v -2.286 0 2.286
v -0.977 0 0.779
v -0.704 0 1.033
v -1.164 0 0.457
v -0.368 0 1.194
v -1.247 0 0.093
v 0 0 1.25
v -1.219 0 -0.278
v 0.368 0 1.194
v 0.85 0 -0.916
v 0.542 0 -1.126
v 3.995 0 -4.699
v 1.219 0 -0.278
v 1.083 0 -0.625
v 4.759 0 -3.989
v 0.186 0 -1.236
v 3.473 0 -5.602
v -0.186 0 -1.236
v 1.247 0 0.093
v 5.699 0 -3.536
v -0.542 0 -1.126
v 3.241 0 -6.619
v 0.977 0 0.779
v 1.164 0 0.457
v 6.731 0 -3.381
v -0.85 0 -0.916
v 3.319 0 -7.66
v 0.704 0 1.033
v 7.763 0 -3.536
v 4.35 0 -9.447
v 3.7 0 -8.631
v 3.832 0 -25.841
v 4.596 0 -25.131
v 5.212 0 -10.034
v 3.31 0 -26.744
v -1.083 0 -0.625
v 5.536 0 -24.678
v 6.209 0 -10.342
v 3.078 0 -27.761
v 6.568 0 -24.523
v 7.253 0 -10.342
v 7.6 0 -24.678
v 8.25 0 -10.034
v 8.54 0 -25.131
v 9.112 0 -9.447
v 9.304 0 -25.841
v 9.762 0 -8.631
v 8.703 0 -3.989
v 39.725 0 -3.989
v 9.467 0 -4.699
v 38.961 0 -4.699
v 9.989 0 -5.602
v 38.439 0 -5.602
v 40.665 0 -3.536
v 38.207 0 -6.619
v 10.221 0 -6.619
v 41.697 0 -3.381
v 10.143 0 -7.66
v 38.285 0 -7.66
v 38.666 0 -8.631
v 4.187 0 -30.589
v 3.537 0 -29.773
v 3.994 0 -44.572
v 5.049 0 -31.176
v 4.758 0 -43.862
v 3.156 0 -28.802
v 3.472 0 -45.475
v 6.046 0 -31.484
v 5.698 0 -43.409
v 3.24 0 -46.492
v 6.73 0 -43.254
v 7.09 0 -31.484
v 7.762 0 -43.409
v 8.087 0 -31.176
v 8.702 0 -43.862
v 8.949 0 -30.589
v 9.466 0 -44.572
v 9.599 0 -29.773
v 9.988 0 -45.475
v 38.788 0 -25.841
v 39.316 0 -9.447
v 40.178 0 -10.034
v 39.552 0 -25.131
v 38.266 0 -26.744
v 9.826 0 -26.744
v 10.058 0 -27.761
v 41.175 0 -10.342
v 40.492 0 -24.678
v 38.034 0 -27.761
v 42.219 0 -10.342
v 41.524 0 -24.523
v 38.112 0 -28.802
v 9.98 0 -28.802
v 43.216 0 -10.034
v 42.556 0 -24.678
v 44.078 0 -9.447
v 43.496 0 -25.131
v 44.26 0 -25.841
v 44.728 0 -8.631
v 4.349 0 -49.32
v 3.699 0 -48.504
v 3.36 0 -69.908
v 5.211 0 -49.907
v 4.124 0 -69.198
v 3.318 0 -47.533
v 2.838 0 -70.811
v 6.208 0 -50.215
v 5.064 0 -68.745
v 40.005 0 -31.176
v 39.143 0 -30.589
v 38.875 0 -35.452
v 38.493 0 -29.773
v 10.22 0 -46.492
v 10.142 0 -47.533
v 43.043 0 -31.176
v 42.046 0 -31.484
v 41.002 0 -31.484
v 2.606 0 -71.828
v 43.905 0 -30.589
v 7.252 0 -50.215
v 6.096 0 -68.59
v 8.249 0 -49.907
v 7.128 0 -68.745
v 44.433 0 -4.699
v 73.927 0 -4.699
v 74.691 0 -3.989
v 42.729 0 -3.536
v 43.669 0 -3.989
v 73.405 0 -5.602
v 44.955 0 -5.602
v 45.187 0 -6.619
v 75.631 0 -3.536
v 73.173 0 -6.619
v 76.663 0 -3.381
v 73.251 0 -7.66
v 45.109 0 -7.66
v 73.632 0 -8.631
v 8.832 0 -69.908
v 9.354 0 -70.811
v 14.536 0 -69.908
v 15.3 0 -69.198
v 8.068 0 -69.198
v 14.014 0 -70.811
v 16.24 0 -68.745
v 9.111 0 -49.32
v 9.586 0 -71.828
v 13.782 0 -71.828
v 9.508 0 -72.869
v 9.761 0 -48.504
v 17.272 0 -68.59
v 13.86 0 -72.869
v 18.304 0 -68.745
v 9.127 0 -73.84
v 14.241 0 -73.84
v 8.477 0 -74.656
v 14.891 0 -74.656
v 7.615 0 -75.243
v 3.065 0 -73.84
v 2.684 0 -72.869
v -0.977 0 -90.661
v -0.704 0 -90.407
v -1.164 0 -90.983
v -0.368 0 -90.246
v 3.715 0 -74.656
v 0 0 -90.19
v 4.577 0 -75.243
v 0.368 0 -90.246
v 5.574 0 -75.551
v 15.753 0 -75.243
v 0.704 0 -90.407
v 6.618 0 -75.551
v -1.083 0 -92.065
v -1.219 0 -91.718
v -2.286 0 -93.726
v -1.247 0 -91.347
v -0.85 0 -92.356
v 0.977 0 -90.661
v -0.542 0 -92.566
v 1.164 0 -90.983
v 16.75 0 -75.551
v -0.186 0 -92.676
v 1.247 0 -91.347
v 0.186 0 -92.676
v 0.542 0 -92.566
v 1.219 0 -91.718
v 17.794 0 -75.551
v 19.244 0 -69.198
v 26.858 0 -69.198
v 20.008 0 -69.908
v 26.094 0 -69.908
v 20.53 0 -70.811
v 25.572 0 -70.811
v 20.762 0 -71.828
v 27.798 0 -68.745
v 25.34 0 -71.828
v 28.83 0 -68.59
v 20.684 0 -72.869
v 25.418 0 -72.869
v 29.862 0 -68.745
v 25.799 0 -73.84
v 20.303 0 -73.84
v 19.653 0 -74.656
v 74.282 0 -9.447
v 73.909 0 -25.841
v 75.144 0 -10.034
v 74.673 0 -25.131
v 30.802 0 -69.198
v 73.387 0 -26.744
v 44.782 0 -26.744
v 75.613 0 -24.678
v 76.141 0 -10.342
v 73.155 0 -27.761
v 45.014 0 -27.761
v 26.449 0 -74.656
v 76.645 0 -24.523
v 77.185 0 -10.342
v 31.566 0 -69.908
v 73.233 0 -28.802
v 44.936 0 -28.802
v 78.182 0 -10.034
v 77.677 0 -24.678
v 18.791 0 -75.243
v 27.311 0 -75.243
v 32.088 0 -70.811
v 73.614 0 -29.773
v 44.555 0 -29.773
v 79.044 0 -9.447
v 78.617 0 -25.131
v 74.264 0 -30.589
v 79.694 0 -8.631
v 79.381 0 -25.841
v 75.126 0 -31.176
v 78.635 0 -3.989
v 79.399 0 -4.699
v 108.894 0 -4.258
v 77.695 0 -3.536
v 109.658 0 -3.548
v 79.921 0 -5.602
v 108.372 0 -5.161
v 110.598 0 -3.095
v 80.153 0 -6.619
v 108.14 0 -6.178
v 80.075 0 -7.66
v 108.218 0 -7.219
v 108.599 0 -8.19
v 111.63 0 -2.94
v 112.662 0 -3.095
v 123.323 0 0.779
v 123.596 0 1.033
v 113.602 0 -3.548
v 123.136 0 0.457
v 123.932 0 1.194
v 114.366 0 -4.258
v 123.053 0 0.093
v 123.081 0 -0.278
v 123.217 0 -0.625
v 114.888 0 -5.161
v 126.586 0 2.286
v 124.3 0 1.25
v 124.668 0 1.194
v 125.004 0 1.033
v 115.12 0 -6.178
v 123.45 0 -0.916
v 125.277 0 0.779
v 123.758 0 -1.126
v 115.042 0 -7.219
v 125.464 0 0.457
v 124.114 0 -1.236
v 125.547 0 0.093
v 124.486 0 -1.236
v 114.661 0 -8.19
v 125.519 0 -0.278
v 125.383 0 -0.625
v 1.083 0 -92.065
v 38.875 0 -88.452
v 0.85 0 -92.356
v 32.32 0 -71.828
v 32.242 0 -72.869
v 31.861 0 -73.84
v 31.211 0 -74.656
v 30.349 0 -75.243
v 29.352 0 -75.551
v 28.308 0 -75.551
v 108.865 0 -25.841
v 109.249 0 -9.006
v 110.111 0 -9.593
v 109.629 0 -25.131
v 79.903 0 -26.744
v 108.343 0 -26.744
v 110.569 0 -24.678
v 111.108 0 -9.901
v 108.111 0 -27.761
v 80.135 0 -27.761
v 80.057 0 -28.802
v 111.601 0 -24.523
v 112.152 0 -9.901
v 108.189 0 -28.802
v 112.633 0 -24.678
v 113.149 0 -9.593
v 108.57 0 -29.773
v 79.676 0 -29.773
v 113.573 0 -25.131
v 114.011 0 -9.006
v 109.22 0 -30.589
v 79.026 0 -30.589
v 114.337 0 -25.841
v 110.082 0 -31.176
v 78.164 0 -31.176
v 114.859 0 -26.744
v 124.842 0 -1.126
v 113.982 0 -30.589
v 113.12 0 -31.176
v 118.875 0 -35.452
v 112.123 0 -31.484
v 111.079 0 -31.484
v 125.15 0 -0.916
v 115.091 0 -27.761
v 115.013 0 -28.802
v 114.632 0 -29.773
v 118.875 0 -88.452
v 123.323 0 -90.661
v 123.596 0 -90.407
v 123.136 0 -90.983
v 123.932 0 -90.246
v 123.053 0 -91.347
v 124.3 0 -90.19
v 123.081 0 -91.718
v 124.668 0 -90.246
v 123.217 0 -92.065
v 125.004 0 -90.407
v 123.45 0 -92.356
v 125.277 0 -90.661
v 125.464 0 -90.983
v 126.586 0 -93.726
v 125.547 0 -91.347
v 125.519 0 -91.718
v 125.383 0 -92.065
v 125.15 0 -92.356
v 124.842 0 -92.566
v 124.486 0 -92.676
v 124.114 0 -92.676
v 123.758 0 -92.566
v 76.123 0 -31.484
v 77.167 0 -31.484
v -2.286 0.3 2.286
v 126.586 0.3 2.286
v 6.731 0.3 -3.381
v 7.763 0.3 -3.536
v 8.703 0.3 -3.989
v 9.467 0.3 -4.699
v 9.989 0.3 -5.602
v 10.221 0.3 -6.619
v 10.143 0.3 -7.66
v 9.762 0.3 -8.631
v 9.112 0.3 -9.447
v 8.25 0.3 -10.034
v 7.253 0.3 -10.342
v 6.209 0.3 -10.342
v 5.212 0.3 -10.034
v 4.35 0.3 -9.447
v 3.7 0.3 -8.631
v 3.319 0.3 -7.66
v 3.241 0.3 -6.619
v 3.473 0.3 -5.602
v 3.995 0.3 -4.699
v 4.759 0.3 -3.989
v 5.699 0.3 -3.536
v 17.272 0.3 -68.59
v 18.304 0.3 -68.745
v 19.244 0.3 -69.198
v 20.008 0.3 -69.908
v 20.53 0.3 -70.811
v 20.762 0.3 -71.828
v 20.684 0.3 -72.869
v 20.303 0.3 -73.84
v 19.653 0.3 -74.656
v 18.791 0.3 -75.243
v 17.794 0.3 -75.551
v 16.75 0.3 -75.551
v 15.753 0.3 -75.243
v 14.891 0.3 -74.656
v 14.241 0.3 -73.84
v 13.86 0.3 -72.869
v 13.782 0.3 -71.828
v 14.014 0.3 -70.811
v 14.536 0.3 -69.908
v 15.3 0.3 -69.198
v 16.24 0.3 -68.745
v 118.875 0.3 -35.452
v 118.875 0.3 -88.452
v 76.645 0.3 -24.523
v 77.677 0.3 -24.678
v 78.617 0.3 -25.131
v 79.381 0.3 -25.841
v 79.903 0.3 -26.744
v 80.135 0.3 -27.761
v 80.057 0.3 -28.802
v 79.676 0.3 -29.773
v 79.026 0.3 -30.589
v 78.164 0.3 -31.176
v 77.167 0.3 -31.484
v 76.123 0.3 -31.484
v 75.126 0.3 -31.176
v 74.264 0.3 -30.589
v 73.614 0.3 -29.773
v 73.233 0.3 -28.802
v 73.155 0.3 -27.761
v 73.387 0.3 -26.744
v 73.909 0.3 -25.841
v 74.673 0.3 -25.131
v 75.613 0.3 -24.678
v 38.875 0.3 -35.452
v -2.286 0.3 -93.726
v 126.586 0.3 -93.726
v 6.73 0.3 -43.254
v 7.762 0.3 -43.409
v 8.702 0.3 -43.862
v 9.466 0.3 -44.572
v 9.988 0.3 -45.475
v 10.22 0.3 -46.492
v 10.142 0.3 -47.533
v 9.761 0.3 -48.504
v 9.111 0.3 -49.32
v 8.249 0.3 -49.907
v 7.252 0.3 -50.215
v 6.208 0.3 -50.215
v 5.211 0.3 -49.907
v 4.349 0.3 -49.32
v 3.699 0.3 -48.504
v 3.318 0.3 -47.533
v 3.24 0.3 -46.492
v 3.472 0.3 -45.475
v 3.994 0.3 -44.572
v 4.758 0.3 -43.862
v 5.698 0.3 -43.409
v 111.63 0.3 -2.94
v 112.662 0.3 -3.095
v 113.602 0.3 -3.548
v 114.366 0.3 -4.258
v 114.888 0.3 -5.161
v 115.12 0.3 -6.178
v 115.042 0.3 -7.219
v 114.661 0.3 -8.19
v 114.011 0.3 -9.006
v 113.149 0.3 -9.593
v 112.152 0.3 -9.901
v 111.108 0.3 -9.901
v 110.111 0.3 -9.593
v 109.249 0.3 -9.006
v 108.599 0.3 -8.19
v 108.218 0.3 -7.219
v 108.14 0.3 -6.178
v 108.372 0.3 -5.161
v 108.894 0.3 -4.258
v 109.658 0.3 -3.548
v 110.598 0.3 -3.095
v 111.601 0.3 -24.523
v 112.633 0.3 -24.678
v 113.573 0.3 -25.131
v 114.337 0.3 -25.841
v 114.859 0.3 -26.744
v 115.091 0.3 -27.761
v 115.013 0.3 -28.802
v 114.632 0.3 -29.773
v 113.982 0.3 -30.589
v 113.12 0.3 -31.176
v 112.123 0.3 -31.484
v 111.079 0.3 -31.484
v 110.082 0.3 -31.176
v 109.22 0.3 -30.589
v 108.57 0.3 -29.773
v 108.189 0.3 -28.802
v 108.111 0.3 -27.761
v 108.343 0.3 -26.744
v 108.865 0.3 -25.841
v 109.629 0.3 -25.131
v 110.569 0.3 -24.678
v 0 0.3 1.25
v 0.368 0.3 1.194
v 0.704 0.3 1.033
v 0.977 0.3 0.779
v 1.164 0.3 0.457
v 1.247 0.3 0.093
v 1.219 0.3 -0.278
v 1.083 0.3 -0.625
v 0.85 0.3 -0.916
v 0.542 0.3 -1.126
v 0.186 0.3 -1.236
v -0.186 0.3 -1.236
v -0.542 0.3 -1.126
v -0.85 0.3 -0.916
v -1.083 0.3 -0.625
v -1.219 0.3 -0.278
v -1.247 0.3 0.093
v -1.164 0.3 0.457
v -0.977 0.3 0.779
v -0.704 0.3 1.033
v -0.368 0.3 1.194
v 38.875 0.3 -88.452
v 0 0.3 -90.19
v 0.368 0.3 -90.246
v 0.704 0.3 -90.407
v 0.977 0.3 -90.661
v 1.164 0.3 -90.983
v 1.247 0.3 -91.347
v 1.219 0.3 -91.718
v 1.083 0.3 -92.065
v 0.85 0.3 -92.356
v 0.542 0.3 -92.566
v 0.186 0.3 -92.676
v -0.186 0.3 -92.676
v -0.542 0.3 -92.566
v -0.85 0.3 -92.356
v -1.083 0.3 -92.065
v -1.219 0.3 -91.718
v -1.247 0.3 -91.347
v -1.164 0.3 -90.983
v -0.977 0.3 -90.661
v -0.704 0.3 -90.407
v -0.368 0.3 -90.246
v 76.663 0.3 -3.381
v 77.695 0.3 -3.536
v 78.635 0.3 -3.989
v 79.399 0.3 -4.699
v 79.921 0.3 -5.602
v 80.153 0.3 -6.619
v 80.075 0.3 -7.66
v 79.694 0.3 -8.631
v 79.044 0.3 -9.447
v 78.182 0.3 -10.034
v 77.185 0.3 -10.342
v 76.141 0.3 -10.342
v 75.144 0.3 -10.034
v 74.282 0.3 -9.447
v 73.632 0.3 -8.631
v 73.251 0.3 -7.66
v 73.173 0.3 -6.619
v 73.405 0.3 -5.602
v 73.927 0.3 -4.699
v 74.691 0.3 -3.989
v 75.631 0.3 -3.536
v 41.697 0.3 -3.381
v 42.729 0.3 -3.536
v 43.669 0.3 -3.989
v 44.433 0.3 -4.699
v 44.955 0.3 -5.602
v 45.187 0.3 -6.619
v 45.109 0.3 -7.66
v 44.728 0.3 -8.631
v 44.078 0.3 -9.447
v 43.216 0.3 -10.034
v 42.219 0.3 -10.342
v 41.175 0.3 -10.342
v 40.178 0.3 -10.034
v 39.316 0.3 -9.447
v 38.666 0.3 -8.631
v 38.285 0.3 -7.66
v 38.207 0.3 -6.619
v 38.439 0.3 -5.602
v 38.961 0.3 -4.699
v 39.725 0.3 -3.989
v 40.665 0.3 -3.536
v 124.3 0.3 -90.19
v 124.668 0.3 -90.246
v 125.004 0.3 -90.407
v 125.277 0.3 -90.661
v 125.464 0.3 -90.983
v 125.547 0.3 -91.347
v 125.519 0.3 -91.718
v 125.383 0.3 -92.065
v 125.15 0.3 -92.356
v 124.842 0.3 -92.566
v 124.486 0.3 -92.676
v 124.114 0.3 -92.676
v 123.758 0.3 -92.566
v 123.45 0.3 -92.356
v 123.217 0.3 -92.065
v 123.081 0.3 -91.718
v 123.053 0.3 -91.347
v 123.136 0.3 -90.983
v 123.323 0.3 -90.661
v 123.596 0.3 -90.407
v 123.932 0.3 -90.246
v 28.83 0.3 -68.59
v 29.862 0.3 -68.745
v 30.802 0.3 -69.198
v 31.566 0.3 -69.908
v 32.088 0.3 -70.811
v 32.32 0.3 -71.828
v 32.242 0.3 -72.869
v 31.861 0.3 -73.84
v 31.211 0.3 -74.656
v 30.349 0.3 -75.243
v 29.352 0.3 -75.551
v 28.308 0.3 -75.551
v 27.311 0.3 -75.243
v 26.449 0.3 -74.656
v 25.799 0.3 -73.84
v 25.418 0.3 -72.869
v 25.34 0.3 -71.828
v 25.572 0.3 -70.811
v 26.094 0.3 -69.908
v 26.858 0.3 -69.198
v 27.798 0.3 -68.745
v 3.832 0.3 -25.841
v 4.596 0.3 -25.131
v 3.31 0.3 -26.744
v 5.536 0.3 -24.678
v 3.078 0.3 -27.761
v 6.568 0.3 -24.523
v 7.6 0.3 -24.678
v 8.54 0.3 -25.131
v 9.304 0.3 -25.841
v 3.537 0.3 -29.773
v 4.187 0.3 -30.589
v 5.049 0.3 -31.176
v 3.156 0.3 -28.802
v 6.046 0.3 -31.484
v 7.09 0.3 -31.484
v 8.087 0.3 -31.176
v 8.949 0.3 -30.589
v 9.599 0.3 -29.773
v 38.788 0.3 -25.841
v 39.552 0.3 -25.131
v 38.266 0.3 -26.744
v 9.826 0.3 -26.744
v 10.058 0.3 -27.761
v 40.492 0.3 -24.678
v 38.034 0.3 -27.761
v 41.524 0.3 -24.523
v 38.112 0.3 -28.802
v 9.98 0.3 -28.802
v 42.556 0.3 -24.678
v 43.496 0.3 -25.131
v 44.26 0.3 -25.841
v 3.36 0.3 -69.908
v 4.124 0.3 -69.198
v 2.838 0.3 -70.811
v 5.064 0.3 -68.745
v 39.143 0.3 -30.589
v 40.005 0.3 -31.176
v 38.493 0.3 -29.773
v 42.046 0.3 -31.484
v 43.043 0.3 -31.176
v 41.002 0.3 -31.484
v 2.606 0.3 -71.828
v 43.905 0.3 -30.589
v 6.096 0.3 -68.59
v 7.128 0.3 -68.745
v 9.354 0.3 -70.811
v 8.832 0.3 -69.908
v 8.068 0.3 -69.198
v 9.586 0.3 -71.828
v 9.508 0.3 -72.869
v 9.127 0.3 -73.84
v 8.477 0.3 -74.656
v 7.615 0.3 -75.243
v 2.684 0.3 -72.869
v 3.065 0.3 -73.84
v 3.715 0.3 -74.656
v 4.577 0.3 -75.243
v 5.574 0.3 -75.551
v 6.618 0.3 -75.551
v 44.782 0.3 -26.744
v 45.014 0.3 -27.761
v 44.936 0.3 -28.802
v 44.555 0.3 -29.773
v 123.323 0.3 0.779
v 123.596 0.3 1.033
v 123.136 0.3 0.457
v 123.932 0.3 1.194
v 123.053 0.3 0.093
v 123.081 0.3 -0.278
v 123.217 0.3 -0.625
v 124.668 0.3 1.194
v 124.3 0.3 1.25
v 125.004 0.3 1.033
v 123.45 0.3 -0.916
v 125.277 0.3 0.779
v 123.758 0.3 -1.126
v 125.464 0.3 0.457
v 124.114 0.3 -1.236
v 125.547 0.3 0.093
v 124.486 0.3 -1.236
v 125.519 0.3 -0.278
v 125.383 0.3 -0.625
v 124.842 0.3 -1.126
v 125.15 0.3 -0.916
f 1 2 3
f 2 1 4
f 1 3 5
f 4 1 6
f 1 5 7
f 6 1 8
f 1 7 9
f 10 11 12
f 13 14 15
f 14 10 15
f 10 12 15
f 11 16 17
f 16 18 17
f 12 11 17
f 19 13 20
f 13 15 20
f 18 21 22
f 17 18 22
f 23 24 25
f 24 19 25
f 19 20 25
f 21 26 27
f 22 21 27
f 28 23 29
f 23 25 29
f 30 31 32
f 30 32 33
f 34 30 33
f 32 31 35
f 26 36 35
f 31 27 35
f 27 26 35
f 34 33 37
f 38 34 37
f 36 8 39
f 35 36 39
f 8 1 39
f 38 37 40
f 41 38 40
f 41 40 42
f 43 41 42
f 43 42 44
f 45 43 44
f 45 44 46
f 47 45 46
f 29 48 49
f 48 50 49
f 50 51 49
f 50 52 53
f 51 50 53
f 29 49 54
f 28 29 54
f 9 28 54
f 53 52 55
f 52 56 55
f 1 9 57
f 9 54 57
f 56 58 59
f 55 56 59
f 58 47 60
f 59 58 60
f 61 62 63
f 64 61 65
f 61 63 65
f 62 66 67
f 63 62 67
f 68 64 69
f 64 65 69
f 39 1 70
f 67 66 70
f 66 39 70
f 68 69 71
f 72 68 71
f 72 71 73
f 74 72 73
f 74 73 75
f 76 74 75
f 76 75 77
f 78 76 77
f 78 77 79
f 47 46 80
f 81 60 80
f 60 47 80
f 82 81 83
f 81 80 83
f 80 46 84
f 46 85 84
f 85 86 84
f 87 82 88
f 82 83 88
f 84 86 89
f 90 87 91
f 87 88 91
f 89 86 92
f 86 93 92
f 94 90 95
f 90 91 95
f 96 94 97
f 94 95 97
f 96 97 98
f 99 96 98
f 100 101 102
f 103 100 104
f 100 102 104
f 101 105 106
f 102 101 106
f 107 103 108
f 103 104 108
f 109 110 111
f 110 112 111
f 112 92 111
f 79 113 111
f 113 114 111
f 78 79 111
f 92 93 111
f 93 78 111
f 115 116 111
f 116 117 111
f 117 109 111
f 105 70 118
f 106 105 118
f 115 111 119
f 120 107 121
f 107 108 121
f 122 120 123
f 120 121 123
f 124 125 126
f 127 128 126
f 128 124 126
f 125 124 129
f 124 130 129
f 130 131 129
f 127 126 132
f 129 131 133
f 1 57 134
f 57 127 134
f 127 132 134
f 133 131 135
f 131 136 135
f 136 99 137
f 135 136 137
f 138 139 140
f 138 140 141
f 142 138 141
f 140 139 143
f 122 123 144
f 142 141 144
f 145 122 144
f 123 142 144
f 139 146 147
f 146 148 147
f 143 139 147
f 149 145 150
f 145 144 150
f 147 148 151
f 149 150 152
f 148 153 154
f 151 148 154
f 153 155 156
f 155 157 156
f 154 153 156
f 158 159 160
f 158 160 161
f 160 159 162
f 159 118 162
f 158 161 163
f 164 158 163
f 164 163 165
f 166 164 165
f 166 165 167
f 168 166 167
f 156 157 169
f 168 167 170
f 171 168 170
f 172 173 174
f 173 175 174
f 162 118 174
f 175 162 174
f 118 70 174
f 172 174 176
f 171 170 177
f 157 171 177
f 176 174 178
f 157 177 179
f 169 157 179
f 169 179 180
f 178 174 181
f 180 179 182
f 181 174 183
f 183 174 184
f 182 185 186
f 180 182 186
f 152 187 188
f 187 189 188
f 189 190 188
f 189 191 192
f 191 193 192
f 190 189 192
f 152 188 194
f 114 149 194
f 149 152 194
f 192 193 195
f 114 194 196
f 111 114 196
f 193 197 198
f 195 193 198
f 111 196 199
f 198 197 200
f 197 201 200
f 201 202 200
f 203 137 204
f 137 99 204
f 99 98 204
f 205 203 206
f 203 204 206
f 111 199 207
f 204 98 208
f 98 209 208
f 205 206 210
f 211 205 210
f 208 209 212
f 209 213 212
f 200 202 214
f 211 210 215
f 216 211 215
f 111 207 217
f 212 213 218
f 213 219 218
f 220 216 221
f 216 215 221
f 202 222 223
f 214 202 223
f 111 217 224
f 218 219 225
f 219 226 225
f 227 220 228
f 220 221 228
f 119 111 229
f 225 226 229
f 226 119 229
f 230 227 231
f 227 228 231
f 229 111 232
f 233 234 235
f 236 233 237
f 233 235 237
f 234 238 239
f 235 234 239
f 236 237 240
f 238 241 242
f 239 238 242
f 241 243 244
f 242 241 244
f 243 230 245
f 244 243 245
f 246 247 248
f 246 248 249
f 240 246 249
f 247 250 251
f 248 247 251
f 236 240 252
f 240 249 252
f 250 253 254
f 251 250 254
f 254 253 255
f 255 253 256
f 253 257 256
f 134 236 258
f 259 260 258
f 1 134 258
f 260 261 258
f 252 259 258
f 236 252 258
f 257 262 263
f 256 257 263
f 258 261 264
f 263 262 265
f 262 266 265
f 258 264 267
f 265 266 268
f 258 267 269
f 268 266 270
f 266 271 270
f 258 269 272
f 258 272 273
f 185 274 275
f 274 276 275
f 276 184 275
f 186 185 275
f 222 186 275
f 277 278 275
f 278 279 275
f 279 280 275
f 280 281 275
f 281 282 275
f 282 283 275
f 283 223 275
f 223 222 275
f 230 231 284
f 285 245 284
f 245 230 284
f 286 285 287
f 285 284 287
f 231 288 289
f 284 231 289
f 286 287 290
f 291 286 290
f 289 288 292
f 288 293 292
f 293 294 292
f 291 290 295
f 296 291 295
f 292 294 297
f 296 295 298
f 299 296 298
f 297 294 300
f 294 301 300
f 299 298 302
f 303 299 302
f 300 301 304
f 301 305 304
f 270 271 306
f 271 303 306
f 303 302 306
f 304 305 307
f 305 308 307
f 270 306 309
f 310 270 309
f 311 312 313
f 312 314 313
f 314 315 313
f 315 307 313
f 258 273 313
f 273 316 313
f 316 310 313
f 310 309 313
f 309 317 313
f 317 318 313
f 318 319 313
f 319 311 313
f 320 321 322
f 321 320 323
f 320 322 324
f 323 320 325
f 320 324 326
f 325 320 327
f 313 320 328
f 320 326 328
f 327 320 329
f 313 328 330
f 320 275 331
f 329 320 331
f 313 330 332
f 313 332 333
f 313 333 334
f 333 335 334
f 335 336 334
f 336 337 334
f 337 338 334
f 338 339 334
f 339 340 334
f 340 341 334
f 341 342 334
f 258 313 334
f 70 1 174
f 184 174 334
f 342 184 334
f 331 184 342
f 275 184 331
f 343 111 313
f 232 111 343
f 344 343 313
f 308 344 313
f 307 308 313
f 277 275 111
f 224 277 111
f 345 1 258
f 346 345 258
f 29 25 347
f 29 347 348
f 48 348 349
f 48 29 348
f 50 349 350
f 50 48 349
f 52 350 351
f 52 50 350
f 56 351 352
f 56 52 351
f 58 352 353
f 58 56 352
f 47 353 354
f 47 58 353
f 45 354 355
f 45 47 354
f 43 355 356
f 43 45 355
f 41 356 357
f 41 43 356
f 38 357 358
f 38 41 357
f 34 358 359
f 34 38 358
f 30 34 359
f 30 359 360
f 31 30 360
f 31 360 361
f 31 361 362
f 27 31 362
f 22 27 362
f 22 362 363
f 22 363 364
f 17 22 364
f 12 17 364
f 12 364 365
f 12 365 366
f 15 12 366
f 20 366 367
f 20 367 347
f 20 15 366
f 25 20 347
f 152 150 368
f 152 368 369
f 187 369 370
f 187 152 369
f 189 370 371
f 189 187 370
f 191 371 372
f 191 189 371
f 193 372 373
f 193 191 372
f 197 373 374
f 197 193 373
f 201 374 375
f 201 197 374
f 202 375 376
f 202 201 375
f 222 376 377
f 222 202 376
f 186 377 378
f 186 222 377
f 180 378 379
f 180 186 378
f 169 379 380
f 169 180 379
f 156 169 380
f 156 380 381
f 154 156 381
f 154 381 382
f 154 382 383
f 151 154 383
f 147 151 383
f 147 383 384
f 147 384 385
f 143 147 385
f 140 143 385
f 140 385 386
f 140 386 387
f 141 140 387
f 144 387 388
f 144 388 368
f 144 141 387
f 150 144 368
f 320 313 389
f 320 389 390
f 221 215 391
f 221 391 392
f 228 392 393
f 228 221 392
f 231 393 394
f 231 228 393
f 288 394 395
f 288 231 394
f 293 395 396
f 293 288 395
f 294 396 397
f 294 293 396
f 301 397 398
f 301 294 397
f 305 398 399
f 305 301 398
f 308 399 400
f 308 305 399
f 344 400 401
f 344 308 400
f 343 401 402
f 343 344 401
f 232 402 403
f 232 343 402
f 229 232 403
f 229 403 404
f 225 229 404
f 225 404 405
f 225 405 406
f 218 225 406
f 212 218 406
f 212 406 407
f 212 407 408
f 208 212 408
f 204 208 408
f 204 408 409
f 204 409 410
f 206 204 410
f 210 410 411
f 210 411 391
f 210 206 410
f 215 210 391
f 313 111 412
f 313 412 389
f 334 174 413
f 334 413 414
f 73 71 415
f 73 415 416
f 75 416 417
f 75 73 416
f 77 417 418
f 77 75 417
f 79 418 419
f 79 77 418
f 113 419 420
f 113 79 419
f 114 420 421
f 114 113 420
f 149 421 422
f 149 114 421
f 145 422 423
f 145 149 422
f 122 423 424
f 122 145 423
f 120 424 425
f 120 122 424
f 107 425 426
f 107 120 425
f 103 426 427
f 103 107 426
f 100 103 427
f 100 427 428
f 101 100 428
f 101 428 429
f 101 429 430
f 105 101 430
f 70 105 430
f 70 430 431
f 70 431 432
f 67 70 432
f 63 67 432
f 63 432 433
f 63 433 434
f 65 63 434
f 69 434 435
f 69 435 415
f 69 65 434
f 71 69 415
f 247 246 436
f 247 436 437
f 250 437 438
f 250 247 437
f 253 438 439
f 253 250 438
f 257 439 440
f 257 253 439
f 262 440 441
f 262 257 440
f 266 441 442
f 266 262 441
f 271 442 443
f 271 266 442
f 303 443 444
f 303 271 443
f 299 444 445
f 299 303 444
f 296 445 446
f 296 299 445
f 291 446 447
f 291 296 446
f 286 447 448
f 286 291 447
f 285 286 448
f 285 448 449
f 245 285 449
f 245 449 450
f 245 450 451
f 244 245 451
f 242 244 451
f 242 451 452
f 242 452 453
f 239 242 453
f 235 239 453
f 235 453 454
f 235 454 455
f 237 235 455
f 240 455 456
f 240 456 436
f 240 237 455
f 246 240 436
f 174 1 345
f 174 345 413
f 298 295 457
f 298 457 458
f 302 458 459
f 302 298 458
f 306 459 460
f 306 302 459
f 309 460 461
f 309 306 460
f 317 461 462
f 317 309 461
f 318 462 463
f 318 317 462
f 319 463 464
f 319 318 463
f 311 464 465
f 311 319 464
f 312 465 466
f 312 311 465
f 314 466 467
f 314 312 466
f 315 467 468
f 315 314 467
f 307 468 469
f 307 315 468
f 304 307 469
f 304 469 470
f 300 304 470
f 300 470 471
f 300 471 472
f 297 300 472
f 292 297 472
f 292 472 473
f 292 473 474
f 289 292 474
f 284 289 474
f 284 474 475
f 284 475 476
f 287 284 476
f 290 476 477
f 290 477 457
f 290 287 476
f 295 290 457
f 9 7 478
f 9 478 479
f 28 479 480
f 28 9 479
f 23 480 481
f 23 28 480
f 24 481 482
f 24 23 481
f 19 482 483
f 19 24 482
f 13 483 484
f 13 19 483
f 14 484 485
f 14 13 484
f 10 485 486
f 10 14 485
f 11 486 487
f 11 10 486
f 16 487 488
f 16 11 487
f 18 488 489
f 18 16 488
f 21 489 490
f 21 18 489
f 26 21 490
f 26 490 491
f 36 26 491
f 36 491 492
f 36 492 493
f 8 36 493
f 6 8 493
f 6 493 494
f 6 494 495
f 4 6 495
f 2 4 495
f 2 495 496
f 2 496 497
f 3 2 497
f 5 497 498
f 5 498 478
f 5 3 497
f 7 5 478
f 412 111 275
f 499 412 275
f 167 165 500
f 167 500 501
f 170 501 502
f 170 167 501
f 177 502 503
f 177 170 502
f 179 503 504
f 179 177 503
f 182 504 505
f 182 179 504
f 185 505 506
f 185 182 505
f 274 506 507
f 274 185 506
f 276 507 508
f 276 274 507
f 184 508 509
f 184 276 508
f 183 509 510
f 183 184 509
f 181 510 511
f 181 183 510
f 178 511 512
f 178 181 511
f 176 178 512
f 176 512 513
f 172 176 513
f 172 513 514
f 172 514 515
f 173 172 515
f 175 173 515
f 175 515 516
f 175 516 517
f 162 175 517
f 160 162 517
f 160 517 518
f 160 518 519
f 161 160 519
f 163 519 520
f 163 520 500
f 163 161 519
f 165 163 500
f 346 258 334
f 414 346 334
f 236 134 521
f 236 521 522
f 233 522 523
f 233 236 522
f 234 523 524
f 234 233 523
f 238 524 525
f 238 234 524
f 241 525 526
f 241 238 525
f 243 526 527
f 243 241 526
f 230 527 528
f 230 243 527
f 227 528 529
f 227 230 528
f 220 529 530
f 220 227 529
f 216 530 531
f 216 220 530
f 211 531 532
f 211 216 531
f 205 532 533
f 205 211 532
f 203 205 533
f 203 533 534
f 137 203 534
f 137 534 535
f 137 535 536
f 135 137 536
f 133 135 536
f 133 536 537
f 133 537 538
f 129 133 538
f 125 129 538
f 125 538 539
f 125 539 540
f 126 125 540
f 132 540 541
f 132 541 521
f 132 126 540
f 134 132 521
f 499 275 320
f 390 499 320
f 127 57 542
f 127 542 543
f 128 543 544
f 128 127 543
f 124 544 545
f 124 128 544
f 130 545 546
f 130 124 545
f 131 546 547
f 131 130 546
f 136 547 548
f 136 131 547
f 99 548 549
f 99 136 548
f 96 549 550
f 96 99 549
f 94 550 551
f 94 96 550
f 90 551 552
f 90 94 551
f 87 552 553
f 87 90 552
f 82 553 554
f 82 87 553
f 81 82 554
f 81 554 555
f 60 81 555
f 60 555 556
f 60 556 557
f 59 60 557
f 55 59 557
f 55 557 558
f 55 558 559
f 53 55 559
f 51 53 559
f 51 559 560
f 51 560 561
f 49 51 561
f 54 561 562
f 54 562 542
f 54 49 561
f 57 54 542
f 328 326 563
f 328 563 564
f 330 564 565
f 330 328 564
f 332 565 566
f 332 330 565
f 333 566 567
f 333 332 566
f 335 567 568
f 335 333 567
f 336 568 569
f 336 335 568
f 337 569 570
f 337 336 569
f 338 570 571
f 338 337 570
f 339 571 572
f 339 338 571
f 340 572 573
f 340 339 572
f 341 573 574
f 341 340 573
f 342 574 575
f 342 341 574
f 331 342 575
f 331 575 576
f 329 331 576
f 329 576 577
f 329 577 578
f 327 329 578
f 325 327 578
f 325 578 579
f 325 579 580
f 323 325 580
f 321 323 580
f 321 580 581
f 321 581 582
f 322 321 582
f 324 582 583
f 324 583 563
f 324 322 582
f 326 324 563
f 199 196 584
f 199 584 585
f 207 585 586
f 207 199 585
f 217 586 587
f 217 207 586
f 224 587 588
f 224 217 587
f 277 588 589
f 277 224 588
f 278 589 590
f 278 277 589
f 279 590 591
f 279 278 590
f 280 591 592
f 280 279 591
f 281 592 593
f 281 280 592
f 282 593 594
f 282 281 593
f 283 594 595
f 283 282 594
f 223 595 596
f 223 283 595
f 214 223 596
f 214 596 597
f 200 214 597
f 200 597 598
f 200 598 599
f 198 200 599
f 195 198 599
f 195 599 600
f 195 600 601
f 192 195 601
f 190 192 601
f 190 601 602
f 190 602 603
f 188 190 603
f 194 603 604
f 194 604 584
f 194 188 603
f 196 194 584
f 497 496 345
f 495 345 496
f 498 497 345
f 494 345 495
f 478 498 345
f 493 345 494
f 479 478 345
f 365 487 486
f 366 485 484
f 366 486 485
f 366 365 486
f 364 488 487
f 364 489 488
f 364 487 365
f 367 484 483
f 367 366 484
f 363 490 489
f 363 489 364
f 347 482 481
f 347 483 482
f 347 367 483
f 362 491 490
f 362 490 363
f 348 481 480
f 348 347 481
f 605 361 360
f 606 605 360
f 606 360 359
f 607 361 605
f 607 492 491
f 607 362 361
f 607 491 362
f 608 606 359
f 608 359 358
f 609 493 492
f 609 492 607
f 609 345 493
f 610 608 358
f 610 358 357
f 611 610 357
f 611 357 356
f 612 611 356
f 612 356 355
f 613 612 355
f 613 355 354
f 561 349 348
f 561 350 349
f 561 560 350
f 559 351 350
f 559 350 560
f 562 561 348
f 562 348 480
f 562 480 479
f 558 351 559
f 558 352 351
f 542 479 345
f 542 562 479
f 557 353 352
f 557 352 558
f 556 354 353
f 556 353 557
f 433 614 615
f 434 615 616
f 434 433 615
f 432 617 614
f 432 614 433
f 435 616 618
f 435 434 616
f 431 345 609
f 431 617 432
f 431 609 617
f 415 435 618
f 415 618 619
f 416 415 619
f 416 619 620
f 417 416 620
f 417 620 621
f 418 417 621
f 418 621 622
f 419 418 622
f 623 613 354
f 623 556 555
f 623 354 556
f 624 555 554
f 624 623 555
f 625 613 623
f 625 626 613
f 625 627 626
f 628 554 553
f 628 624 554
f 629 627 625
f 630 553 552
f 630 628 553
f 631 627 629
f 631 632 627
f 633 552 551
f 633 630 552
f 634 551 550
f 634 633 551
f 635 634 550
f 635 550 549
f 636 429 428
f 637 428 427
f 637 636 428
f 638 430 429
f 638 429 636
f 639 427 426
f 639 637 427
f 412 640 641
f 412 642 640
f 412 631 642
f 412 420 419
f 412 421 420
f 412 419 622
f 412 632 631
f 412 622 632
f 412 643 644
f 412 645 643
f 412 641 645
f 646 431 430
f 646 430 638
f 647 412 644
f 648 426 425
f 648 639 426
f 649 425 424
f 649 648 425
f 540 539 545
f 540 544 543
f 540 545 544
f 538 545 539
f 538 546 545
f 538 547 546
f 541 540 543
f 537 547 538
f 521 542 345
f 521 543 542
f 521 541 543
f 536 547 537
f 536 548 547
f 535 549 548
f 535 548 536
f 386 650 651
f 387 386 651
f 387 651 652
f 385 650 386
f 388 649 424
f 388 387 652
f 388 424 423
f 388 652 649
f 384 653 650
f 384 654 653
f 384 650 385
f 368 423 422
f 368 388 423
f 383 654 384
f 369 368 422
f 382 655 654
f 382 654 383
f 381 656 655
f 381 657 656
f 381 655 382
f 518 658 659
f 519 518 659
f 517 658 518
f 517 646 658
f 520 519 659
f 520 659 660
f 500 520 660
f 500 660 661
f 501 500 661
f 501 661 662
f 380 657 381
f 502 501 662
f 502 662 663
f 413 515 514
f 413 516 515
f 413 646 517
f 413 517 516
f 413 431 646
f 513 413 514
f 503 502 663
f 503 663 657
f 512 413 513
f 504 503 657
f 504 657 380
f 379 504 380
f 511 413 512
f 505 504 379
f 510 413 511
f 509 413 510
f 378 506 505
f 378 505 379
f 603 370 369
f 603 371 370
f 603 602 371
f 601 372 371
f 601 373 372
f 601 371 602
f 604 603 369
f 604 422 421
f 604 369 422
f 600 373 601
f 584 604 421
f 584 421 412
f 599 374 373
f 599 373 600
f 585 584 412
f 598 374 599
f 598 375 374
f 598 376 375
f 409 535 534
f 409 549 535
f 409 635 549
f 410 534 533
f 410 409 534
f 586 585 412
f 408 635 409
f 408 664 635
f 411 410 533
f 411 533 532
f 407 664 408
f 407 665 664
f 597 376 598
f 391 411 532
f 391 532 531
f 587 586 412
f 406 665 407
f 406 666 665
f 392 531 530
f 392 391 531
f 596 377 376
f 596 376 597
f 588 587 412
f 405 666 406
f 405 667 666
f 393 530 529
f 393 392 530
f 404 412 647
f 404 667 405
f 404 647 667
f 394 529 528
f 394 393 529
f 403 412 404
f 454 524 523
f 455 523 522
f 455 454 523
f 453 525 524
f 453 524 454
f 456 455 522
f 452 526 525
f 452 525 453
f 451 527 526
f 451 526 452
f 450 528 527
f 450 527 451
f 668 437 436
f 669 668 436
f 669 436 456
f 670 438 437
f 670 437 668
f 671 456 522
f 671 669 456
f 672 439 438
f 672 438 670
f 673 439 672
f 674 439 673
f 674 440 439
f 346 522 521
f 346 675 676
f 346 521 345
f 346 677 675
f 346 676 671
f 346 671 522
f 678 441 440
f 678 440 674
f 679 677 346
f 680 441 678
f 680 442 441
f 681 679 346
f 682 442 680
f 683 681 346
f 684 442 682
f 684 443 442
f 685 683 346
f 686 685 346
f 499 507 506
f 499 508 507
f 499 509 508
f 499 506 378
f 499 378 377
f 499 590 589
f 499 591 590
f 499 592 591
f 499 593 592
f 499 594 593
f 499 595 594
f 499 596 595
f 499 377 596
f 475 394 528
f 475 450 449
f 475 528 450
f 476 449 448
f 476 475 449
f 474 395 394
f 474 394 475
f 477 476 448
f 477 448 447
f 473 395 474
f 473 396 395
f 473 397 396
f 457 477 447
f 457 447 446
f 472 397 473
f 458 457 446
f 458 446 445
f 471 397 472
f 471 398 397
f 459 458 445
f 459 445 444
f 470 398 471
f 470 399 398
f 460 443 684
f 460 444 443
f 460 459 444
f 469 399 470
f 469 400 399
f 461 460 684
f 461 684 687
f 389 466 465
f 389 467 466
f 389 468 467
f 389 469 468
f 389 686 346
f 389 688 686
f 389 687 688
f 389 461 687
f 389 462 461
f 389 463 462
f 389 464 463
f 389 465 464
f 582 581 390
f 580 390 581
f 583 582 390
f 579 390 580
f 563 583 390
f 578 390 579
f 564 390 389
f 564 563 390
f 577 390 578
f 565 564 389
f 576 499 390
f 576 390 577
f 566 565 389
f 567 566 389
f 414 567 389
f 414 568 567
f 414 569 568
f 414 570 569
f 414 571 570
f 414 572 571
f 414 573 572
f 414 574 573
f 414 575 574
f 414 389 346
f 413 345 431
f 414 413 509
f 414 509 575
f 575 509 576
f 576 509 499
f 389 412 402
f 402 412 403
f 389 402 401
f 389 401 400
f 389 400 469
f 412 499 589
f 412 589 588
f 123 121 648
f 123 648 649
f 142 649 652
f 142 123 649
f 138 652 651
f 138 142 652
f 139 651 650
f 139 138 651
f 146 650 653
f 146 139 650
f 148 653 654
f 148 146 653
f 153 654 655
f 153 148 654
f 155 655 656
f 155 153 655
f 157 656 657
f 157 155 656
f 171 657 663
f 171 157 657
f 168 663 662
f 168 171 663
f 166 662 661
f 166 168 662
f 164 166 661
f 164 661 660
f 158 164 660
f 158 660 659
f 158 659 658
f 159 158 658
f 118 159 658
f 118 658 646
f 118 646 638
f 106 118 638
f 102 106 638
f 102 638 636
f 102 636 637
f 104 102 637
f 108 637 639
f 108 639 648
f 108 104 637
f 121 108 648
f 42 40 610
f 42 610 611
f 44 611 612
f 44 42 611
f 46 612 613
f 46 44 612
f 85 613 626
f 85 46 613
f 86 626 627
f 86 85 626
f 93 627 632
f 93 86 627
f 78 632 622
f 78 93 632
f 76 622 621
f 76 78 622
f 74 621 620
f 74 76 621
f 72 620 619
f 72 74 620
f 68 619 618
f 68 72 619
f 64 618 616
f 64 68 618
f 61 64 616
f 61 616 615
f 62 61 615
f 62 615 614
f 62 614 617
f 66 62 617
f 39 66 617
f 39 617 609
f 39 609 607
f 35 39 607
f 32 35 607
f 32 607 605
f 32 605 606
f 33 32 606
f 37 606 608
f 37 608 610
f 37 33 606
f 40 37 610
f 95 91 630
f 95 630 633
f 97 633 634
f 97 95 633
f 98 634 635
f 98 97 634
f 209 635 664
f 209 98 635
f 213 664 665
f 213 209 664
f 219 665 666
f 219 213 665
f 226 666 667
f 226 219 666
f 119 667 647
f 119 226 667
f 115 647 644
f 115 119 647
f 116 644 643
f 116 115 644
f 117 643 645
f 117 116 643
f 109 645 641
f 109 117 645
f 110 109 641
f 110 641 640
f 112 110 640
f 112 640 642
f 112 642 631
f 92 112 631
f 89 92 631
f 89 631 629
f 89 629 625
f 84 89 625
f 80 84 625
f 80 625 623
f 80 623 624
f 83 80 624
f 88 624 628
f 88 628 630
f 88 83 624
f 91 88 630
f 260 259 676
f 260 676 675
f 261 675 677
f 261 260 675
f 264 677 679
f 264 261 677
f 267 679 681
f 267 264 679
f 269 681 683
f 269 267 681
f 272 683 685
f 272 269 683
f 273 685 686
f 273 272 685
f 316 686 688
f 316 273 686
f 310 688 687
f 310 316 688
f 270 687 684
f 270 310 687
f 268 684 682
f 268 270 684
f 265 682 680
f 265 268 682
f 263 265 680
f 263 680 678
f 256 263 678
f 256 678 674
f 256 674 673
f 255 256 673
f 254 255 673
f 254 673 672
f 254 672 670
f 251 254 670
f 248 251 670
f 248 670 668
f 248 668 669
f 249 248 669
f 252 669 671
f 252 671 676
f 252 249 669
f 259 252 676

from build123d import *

# Parameters (mm, degrees)
SKETCH1_W           = 128.872
SKETCH1_H           = 96.012
SKETCH1_R           = 1.25
SKETCH1_R_2         = 3.5
SKETCH1_W_2         = 80
SKETCH1_H_2         = 53
BOSS_EXTRUDE1_DEPTH = 0.3


with BuildPart() as part:
    # Sketch1 → Boss-Extrude1 (new body)
    with BuildSketch(Plane(origin=(0, 0, 0), x_dir=(1, 0, 0), z_dir=(0, 1, 0))):
        with Locations((62.15, 45.72)):
            Rectangle(SKETCH1_W, SKETCH1_H)
        with Locations(Location((0, 91.44, 0), (0, 0, 270))):
            Circle(SKETCH1_R, mode=Mode.SUBTRACT)
        with Locations(Location((124.3, 91.44, 0), (0, 0, 270))):
            Circle(SKETCH1_R, mode=Mode.SUBTRACT)
        with Locations(Location((0, 0, 0), (0, 0, 270))):
            Circle(SKETCH1_R, mode=Mode.SUBTRACT)
        with Locations(Location((124.3, 0, 0), (0, 0, 270))):
            Circle(SKETCH1_R, mode=Mode.SUBTRACT)
        with Locations(Location((6.731, 6.881, 0), (0, 0, 270))):
            Circle(SKETCH1_R_2, mode=Mode.SUBTRACT)
        with Locations(Location((41.697, 6.881, 0), (0, 0, 270))):
            Circle(SKETCH1_R_2, mode=Mode.SUBTRACT)
        with Locations(Location((76.663, 6.881, 0), (0, 0, 270))):
            Circle(SKETCH1_R_2, mode=Mode.SUBTRACT)
        with Locations(Location((111.63, 6.44, 0), (0, 0, 270))):
            Circle(SKETCH1_R_2, mode=Mode.SUBTRACT)
        with Locations(Location((6.73, 46.754, 0), (0, 0, 270))):
            Circle(SKETCH1_R_2, mode=Mode.SUBTRACT)
        with Locations(Location((6.568, 28.023, 0), (0, 0, 270))):
            Circle(SKETCH1_R_2, mode=Mode.SUBTRACT)
        with Locations(Location((41.524, 28.023, 0), (0, 0, 270))):
            Circle(SKETCH1_R_2, mode=Mode.SUBTRACT)
        with Locations(Location((76.645, 28.023, 0), (0, 0, 270))):
            Circle(SKETCH1_R_2, mode=Mode.SUBTRACT)
        with Locations(Location((111.601, 28.023, 0), (0, 0, 270))):
            Circle(SKETCH1_R_2, mode=Mode.SUBTRACT)
        with Locations(Location((6.096, 72.09, 0), (0, 0, 270))):
            Circle(SKETCH1_R_2, mode=Mode.SUBTRACT)
        with Locations(Location((17.272, 72.09, 0), (0, 0, 270))):
            Circle(SKETCH1_R_2, mode=Mode.SUBTRACT)
        with Locations(Location((28.83, 72.09, 0), (0, 0, 270))):
            Circle(SKETCH1_R_2, mode=Mode.SUBTRACT)
        with Locations((78.875410923, 61.951987271)):
            Rectangle(SKETCH1_W_2, SKETCH1_H_2, mode=Mode.SUBTRACT)
    extrude(amount=BOSS_EXTRUDE1_DEPTH)


solid = part.part
